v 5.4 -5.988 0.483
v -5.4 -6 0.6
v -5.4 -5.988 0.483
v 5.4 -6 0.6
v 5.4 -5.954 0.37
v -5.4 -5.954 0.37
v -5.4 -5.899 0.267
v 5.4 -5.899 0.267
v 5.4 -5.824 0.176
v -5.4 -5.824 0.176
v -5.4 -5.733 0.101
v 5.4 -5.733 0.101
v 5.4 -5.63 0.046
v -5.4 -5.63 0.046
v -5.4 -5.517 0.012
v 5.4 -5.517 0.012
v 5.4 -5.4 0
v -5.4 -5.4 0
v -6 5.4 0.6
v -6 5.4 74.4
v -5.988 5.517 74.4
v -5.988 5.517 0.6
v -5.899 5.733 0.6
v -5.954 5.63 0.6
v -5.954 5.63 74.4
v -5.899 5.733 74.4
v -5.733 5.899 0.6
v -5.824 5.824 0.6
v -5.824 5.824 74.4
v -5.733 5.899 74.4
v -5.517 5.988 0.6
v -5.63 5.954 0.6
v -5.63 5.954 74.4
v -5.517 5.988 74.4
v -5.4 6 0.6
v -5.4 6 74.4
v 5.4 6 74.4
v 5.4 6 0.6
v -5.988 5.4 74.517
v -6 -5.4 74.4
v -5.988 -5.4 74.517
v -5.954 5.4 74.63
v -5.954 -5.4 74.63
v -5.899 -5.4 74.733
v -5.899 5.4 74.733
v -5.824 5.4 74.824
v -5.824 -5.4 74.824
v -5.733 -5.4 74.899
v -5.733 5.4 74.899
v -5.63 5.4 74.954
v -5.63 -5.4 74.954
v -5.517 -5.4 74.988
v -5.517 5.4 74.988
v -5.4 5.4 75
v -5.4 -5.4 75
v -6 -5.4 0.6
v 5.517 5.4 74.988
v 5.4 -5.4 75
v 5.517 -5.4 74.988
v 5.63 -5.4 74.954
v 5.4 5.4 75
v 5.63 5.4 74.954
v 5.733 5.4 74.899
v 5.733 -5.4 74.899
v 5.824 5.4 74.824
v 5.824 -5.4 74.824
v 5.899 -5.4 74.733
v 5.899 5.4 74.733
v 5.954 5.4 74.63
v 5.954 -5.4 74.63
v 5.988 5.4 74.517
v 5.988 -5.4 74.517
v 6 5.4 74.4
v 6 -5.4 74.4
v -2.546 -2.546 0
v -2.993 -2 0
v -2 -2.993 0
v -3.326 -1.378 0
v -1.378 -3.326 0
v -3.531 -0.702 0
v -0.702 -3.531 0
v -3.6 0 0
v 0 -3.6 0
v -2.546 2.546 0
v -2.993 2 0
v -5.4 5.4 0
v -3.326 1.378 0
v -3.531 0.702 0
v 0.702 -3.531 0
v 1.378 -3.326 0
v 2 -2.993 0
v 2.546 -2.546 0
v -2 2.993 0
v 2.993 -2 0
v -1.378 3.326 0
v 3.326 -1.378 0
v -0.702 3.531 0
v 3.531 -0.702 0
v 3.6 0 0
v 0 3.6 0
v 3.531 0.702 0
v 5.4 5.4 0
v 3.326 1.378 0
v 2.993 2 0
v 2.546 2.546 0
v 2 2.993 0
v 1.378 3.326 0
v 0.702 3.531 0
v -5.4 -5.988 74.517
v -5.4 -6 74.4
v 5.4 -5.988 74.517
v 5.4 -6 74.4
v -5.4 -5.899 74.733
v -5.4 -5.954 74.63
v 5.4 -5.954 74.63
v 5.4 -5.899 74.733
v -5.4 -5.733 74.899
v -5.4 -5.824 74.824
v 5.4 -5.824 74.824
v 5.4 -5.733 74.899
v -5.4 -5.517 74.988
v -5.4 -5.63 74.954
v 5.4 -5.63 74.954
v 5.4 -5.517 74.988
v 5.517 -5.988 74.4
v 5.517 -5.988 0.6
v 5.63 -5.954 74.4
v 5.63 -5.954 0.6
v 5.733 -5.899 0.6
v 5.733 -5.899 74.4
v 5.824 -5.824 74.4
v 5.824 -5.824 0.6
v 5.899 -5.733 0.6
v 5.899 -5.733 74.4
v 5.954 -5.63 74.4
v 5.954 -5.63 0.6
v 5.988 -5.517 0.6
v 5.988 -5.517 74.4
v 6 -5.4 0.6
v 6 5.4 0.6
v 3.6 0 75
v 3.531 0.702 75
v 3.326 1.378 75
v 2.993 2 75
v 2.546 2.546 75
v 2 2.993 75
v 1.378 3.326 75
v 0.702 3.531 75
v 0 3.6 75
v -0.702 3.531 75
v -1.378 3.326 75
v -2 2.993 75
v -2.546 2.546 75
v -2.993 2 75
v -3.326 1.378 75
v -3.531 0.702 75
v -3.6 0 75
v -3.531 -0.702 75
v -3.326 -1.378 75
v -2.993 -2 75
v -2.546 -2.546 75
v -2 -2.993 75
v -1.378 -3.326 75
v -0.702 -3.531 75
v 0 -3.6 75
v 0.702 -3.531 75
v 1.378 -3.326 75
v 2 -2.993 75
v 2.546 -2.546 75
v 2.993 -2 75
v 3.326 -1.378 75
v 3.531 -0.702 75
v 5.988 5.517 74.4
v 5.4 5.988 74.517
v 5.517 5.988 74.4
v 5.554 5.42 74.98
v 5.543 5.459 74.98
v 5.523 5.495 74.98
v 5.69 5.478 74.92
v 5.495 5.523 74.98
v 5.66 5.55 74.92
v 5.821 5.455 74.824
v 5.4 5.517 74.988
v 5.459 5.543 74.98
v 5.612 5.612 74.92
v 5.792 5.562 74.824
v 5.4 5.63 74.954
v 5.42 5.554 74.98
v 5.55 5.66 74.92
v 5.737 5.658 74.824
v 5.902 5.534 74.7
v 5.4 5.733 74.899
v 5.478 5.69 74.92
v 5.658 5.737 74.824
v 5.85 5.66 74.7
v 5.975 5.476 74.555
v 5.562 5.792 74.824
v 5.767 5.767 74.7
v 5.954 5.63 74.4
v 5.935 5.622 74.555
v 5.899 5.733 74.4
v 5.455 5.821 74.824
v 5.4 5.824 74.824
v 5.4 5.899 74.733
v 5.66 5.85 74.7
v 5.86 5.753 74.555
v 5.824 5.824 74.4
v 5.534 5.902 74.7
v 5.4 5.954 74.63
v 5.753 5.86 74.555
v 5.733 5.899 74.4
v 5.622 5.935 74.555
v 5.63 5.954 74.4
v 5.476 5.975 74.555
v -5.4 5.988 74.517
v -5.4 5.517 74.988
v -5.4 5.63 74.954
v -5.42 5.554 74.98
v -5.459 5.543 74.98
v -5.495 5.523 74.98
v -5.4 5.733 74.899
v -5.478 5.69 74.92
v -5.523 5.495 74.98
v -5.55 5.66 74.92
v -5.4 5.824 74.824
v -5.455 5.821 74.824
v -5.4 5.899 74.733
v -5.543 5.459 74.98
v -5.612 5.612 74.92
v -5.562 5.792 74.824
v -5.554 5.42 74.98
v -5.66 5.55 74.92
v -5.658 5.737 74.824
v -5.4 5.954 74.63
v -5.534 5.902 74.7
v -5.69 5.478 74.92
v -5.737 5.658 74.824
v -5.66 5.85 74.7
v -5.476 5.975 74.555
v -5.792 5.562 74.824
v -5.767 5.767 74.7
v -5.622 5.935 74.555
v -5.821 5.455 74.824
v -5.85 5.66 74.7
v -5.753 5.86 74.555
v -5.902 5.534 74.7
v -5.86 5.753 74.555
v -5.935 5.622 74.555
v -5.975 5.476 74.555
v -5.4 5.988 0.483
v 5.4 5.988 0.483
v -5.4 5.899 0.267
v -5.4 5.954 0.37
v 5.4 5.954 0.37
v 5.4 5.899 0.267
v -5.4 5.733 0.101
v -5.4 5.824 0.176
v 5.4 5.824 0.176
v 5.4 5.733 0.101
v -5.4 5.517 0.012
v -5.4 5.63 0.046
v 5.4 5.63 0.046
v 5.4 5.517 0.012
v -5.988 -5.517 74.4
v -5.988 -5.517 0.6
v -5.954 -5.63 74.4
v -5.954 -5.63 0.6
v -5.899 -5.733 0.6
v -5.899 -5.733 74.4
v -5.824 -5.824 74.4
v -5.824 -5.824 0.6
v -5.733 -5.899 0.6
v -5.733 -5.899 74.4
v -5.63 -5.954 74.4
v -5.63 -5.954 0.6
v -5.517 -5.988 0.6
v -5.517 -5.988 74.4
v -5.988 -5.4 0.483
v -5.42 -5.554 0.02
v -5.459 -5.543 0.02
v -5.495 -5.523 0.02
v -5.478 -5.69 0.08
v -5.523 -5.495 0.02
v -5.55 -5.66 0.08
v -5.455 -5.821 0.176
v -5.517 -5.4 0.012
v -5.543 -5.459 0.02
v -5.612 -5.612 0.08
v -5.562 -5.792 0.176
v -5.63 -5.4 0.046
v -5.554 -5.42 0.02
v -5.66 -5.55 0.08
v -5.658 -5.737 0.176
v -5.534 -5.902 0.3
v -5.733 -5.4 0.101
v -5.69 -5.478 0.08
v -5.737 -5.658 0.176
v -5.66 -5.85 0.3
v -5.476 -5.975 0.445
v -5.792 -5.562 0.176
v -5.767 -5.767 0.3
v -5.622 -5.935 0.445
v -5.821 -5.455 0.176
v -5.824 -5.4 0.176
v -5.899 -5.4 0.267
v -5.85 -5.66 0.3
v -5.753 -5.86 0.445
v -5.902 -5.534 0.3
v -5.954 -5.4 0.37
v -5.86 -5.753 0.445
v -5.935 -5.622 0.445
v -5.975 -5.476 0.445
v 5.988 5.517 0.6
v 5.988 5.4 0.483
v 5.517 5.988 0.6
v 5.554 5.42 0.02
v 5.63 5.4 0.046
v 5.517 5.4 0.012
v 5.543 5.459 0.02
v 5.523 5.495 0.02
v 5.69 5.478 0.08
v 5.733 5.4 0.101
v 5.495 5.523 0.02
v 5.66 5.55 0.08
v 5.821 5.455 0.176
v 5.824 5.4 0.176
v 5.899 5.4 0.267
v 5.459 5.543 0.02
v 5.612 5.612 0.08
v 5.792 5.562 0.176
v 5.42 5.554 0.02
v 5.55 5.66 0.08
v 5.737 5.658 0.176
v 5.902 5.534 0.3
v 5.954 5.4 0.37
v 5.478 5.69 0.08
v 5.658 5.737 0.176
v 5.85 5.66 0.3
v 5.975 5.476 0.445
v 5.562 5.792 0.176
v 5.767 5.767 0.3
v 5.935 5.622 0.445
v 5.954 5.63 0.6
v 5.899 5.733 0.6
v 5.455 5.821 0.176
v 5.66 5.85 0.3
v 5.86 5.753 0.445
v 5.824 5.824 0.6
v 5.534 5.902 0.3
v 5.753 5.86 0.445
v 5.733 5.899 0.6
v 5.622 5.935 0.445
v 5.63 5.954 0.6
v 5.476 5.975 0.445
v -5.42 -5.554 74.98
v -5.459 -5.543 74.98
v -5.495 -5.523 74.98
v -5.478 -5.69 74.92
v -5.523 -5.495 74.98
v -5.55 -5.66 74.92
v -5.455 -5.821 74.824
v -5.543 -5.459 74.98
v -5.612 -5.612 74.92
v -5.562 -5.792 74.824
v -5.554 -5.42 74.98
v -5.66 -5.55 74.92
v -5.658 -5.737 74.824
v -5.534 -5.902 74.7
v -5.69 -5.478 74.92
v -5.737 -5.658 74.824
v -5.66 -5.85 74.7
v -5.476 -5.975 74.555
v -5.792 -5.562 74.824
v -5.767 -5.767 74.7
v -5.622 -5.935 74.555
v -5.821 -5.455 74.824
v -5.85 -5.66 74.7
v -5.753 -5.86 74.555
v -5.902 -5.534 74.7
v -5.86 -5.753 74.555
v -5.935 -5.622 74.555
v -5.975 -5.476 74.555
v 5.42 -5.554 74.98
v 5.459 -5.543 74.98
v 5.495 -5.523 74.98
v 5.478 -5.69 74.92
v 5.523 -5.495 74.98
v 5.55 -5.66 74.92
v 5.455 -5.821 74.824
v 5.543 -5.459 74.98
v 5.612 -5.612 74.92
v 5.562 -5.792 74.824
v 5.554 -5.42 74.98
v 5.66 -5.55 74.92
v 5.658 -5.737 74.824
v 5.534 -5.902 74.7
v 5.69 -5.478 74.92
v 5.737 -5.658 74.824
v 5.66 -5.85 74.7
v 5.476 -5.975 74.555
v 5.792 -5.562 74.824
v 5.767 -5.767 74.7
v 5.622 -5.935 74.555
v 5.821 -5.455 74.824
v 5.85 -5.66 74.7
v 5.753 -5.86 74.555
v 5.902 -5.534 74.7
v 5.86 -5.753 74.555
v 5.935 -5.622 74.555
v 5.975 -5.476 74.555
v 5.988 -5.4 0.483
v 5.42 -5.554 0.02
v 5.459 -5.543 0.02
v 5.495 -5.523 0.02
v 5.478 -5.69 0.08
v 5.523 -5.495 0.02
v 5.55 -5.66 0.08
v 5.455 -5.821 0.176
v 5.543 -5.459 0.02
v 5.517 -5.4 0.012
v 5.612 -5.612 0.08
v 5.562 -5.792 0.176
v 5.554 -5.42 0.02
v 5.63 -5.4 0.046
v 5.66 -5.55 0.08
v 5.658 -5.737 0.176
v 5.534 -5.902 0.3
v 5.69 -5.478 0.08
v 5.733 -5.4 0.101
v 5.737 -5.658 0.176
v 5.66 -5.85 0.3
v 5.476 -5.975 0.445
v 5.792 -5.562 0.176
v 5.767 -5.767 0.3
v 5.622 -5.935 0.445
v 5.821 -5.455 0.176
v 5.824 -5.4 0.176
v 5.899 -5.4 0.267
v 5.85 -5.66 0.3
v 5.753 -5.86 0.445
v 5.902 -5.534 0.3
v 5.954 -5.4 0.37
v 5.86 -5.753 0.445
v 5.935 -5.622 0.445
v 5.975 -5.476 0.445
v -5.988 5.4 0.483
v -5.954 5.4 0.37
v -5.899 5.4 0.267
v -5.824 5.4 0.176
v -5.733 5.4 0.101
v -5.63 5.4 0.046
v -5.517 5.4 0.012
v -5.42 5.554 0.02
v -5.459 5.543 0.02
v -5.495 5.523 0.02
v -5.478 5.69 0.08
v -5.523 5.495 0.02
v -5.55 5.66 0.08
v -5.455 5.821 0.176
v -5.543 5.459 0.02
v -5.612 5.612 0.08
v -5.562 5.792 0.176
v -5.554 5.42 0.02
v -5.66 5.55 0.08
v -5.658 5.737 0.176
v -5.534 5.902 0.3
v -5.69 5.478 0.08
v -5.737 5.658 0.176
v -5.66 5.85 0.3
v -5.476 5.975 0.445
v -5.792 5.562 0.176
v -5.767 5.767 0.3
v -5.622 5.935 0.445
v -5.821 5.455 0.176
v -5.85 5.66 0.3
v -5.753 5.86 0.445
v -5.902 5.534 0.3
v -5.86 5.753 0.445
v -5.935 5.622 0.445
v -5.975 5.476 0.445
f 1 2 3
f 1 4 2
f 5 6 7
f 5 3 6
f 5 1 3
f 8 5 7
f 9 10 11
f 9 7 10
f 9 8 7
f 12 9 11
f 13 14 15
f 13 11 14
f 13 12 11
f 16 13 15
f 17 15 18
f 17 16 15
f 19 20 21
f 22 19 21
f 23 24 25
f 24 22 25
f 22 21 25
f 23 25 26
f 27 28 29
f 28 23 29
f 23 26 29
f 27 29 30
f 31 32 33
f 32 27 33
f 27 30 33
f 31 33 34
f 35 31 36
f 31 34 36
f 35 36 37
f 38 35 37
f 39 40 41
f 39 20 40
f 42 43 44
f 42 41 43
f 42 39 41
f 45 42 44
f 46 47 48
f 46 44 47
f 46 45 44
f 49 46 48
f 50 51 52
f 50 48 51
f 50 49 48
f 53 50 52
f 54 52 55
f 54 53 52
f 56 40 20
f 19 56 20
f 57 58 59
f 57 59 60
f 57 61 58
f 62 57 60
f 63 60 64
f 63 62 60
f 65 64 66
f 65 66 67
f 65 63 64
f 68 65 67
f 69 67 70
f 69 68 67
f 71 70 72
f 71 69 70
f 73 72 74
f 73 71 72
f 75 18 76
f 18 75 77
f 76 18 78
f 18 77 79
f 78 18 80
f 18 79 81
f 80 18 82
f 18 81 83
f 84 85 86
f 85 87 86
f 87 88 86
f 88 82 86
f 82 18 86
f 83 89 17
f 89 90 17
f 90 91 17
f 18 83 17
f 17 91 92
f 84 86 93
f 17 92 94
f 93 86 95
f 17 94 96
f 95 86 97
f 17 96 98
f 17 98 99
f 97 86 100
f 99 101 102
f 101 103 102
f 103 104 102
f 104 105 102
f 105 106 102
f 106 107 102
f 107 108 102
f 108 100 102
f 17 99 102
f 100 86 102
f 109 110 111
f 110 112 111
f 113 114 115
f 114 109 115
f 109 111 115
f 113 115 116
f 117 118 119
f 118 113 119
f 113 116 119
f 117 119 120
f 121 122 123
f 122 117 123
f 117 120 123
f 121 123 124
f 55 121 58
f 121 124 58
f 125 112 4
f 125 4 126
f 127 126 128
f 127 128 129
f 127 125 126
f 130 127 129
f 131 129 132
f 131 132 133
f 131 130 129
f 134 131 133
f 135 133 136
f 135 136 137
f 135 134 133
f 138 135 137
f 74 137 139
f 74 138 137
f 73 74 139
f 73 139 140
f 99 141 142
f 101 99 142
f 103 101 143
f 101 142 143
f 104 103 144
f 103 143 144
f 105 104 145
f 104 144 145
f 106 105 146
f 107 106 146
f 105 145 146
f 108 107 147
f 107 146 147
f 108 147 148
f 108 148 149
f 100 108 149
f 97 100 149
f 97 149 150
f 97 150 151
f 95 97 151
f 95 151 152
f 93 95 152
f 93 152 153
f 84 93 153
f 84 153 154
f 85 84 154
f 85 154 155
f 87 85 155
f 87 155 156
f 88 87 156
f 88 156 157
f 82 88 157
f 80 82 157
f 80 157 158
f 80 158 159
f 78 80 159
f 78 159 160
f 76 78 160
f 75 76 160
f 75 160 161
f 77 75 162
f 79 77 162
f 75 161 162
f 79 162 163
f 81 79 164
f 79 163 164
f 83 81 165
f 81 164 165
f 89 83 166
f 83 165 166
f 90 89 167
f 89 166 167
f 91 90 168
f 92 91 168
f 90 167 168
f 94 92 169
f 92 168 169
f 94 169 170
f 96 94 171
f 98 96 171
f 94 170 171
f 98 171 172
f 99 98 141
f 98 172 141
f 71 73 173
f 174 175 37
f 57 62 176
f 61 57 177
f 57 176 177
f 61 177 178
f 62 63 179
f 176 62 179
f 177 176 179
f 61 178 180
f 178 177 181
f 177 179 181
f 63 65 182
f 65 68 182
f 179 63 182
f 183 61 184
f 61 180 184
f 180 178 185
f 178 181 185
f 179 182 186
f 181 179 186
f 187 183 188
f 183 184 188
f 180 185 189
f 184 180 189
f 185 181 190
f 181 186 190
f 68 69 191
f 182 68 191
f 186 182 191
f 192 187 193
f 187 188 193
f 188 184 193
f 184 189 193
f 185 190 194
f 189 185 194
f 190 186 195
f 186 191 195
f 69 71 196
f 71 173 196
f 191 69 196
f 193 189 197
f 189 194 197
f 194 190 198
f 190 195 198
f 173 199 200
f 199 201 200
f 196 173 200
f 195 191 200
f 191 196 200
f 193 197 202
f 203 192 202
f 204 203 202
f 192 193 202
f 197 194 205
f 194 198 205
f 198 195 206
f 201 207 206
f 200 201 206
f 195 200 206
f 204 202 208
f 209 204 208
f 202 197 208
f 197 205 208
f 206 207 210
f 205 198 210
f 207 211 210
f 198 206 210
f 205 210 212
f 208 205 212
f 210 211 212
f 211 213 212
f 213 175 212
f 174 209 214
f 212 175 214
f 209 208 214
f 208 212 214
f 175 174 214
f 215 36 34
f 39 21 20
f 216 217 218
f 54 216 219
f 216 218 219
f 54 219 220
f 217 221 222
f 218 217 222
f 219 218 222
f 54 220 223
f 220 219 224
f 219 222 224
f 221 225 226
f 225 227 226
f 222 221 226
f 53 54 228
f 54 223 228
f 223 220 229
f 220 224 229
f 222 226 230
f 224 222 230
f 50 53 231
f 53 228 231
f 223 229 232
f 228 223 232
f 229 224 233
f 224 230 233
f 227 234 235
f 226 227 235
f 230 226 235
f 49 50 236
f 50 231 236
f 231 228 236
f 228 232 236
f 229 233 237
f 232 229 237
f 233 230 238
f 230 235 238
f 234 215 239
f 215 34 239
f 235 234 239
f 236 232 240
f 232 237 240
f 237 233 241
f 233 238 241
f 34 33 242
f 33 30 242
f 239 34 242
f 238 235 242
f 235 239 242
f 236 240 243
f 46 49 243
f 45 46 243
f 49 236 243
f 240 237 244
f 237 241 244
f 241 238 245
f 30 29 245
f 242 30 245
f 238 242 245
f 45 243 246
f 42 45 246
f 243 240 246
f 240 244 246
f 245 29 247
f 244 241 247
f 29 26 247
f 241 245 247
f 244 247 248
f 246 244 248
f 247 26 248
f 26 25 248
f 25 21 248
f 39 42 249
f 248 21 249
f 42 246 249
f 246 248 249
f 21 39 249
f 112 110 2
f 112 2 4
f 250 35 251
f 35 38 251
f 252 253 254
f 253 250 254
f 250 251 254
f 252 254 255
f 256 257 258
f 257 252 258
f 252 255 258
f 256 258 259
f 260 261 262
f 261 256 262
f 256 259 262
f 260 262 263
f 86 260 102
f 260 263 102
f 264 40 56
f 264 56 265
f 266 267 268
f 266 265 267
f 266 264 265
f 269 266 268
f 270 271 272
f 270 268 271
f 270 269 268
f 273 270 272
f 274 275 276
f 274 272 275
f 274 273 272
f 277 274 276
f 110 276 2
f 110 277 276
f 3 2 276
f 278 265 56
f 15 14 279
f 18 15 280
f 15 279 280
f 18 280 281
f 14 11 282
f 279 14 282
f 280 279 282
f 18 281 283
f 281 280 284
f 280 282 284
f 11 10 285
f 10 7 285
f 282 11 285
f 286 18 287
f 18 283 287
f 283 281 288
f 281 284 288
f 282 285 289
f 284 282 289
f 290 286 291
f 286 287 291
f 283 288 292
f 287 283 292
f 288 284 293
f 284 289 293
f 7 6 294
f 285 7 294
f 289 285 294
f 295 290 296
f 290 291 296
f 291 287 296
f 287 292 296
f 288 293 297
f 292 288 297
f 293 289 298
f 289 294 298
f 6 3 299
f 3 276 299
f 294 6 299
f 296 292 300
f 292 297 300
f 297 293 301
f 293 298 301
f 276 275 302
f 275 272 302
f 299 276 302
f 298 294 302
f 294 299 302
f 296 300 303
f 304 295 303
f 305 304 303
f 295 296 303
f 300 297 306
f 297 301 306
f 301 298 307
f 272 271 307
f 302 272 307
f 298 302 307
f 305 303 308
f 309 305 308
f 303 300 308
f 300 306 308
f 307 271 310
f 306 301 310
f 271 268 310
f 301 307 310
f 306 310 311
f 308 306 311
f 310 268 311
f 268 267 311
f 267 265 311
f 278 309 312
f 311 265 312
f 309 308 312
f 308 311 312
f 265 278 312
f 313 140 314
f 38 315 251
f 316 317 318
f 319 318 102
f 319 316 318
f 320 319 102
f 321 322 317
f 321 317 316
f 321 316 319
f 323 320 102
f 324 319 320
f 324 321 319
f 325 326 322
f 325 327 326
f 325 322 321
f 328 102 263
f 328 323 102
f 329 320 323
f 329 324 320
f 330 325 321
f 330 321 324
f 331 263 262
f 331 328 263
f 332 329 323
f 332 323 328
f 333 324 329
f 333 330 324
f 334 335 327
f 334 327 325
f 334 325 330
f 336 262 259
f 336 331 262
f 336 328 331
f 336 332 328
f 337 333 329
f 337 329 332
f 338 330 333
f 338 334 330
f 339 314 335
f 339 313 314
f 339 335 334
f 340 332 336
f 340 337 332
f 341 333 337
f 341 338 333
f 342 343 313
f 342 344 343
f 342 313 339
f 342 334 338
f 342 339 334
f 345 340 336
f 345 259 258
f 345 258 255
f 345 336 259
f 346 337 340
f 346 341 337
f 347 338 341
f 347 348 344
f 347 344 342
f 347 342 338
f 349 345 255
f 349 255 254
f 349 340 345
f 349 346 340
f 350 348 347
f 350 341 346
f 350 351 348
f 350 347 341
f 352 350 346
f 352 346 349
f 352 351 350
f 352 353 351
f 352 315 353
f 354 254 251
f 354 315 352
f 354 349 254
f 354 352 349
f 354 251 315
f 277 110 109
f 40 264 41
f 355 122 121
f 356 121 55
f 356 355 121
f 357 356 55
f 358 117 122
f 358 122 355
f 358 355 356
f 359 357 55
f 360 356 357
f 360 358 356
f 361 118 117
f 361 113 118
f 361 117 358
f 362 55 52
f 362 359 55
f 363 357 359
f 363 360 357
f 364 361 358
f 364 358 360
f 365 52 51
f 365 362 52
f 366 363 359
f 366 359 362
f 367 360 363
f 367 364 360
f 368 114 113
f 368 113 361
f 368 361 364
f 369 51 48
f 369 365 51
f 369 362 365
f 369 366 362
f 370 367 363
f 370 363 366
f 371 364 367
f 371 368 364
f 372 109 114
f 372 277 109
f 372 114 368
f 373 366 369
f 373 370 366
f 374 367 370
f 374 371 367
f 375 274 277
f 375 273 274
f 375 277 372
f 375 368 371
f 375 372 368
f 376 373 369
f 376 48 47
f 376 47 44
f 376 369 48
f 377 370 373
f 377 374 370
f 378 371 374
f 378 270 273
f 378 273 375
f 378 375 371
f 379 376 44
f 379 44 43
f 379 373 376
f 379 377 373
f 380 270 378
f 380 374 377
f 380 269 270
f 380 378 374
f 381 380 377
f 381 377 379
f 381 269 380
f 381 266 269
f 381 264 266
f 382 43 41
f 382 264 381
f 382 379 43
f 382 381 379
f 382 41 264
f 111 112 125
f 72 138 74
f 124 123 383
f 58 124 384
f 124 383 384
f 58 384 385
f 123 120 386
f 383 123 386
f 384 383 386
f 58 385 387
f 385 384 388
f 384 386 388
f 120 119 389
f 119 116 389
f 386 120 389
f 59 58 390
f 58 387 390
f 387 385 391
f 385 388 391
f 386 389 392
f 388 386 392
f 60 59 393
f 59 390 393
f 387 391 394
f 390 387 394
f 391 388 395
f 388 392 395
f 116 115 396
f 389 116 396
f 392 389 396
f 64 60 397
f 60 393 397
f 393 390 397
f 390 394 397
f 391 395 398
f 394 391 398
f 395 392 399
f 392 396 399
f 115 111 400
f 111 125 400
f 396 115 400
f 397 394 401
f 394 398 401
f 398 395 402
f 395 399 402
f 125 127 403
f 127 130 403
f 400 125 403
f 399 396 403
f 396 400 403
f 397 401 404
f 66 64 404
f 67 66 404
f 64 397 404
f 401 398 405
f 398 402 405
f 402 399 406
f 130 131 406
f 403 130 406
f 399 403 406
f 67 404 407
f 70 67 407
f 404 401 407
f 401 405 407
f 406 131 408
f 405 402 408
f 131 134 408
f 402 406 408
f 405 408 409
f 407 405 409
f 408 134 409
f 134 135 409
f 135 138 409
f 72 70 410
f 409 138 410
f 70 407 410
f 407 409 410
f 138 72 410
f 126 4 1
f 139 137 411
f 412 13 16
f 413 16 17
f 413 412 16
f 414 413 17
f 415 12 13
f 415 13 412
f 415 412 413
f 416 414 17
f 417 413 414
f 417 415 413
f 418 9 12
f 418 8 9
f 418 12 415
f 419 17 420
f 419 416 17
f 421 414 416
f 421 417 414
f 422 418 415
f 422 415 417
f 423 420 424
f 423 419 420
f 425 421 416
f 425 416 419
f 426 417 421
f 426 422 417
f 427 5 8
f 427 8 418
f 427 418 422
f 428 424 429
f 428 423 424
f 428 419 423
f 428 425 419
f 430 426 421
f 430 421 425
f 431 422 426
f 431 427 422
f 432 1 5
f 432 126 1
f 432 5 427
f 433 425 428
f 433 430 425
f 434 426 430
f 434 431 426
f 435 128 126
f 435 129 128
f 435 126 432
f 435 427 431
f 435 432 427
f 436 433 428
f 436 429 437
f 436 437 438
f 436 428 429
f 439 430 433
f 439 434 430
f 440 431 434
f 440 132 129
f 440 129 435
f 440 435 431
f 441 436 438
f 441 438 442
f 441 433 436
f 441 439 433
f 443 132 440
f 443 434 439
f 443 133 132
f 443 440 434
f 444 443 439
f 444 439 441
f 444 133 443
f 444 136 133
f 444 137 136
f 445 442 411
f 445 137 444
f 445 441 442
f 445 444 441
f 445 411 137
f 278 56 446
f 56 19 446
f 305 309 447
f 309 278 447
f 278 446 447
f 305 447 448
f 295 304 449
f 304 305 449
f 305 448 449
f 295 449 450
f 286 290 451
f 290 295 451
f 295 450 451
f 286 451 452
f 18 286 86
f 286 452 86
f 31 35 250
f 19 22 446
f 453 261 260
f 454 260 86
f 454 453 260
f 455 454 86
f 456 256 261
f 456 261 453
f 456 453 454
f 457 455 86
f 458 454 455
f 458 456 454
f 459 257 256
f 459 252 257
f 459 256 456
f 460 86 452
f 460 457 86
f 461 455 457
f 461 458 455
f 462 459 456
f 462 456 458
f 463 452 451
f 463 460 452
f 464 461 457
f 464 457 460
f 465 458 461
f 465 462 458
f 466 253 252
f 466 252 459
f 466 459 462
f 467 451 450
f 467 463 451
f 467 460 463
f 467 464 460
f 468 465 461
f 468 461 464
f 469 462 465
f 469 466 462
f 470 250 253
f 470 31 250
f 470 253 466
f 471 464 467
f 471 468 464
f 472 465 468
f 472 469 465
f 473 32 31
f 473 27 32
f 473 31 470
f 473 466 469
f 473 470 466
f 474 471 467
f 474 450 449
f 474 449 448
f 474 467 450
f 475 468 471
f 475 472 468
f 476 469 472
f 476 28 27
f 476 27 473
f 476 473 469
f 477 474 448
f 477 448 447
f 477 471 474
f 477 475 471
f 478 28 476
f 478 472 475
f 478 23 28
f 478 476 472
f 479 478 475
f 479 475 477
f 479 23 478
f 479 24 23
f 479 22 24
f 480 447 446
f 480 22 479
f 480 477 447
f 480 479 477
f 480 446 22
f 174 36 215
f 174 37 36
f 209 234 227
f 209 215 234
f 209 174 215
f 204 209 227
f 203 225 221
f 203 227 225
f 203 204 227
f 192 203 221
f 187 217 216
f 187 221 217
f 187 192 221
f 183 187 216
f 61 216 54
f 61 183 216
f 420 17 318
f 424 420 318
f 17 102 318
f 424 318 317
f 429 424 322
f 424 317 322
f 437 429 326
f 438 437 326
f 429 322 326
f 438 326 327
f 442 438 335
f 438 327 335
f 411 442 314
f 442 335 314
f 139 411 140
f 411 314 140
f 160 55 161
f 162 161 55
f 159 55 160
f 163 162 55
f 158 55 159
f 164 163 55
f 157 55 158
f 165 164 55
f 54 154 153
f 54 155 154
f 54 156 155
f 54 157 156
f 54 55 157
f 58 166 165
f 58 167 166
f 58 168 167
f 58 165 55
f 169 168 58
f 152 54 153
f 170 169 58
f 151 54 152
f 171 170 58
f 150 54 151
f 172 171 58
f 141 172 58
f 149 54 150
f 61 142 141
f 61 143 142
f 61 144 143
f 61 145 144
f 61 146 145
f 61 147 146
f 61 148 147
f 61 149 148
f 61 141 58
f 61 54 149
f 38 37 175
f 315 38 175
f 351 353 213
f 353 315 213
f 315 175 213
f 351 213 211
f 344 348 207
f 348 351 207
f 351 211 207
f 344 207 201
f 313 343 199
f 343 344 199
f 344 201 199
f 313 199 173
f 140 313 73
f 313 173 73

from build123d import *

# Parameters (mm, degrees)
F0_W     = 12
F0_H     = 12
F1_DEPTH = 75
F2_R     = 3.6
F3_DEPTH = 80
F4_R     = 0.6


with BuildPart() as f1:
    # F0 (on Top) → F1 (new body)
    with BuildSketch(Plane.XY):
        Rectangle(F0_W, F0_H)
    extrude(amount=F1_DEPTH)

    # F2 (on face) → F3 (cut)
    with BuildSketch(Plane.XY.offset(75)):
        Circle(F2_R)
    extrude(amount=-F3_DEPTH, mode=Mode.SUBTRACT)

    # F4
    f4_edges = [f1.edges().sort_by_distance(p)[0] for p in [
        (-6, -6, 37.5),
        (6, -6, 37.5),
        (0, -6, 0),
        (0, -6, 75),
        (6, 6, 37.5),
        (6, 0, 0),
        (6, 0, 75),
        (-6, 6, 37.5),
        (0, 6, 0),
        (0, 6, 75),
        (-6, 0, 0),
        (-6, 0, 75),
    ]]
    fillet(f4_edges, radius=F4_R)


solid = f1.part
